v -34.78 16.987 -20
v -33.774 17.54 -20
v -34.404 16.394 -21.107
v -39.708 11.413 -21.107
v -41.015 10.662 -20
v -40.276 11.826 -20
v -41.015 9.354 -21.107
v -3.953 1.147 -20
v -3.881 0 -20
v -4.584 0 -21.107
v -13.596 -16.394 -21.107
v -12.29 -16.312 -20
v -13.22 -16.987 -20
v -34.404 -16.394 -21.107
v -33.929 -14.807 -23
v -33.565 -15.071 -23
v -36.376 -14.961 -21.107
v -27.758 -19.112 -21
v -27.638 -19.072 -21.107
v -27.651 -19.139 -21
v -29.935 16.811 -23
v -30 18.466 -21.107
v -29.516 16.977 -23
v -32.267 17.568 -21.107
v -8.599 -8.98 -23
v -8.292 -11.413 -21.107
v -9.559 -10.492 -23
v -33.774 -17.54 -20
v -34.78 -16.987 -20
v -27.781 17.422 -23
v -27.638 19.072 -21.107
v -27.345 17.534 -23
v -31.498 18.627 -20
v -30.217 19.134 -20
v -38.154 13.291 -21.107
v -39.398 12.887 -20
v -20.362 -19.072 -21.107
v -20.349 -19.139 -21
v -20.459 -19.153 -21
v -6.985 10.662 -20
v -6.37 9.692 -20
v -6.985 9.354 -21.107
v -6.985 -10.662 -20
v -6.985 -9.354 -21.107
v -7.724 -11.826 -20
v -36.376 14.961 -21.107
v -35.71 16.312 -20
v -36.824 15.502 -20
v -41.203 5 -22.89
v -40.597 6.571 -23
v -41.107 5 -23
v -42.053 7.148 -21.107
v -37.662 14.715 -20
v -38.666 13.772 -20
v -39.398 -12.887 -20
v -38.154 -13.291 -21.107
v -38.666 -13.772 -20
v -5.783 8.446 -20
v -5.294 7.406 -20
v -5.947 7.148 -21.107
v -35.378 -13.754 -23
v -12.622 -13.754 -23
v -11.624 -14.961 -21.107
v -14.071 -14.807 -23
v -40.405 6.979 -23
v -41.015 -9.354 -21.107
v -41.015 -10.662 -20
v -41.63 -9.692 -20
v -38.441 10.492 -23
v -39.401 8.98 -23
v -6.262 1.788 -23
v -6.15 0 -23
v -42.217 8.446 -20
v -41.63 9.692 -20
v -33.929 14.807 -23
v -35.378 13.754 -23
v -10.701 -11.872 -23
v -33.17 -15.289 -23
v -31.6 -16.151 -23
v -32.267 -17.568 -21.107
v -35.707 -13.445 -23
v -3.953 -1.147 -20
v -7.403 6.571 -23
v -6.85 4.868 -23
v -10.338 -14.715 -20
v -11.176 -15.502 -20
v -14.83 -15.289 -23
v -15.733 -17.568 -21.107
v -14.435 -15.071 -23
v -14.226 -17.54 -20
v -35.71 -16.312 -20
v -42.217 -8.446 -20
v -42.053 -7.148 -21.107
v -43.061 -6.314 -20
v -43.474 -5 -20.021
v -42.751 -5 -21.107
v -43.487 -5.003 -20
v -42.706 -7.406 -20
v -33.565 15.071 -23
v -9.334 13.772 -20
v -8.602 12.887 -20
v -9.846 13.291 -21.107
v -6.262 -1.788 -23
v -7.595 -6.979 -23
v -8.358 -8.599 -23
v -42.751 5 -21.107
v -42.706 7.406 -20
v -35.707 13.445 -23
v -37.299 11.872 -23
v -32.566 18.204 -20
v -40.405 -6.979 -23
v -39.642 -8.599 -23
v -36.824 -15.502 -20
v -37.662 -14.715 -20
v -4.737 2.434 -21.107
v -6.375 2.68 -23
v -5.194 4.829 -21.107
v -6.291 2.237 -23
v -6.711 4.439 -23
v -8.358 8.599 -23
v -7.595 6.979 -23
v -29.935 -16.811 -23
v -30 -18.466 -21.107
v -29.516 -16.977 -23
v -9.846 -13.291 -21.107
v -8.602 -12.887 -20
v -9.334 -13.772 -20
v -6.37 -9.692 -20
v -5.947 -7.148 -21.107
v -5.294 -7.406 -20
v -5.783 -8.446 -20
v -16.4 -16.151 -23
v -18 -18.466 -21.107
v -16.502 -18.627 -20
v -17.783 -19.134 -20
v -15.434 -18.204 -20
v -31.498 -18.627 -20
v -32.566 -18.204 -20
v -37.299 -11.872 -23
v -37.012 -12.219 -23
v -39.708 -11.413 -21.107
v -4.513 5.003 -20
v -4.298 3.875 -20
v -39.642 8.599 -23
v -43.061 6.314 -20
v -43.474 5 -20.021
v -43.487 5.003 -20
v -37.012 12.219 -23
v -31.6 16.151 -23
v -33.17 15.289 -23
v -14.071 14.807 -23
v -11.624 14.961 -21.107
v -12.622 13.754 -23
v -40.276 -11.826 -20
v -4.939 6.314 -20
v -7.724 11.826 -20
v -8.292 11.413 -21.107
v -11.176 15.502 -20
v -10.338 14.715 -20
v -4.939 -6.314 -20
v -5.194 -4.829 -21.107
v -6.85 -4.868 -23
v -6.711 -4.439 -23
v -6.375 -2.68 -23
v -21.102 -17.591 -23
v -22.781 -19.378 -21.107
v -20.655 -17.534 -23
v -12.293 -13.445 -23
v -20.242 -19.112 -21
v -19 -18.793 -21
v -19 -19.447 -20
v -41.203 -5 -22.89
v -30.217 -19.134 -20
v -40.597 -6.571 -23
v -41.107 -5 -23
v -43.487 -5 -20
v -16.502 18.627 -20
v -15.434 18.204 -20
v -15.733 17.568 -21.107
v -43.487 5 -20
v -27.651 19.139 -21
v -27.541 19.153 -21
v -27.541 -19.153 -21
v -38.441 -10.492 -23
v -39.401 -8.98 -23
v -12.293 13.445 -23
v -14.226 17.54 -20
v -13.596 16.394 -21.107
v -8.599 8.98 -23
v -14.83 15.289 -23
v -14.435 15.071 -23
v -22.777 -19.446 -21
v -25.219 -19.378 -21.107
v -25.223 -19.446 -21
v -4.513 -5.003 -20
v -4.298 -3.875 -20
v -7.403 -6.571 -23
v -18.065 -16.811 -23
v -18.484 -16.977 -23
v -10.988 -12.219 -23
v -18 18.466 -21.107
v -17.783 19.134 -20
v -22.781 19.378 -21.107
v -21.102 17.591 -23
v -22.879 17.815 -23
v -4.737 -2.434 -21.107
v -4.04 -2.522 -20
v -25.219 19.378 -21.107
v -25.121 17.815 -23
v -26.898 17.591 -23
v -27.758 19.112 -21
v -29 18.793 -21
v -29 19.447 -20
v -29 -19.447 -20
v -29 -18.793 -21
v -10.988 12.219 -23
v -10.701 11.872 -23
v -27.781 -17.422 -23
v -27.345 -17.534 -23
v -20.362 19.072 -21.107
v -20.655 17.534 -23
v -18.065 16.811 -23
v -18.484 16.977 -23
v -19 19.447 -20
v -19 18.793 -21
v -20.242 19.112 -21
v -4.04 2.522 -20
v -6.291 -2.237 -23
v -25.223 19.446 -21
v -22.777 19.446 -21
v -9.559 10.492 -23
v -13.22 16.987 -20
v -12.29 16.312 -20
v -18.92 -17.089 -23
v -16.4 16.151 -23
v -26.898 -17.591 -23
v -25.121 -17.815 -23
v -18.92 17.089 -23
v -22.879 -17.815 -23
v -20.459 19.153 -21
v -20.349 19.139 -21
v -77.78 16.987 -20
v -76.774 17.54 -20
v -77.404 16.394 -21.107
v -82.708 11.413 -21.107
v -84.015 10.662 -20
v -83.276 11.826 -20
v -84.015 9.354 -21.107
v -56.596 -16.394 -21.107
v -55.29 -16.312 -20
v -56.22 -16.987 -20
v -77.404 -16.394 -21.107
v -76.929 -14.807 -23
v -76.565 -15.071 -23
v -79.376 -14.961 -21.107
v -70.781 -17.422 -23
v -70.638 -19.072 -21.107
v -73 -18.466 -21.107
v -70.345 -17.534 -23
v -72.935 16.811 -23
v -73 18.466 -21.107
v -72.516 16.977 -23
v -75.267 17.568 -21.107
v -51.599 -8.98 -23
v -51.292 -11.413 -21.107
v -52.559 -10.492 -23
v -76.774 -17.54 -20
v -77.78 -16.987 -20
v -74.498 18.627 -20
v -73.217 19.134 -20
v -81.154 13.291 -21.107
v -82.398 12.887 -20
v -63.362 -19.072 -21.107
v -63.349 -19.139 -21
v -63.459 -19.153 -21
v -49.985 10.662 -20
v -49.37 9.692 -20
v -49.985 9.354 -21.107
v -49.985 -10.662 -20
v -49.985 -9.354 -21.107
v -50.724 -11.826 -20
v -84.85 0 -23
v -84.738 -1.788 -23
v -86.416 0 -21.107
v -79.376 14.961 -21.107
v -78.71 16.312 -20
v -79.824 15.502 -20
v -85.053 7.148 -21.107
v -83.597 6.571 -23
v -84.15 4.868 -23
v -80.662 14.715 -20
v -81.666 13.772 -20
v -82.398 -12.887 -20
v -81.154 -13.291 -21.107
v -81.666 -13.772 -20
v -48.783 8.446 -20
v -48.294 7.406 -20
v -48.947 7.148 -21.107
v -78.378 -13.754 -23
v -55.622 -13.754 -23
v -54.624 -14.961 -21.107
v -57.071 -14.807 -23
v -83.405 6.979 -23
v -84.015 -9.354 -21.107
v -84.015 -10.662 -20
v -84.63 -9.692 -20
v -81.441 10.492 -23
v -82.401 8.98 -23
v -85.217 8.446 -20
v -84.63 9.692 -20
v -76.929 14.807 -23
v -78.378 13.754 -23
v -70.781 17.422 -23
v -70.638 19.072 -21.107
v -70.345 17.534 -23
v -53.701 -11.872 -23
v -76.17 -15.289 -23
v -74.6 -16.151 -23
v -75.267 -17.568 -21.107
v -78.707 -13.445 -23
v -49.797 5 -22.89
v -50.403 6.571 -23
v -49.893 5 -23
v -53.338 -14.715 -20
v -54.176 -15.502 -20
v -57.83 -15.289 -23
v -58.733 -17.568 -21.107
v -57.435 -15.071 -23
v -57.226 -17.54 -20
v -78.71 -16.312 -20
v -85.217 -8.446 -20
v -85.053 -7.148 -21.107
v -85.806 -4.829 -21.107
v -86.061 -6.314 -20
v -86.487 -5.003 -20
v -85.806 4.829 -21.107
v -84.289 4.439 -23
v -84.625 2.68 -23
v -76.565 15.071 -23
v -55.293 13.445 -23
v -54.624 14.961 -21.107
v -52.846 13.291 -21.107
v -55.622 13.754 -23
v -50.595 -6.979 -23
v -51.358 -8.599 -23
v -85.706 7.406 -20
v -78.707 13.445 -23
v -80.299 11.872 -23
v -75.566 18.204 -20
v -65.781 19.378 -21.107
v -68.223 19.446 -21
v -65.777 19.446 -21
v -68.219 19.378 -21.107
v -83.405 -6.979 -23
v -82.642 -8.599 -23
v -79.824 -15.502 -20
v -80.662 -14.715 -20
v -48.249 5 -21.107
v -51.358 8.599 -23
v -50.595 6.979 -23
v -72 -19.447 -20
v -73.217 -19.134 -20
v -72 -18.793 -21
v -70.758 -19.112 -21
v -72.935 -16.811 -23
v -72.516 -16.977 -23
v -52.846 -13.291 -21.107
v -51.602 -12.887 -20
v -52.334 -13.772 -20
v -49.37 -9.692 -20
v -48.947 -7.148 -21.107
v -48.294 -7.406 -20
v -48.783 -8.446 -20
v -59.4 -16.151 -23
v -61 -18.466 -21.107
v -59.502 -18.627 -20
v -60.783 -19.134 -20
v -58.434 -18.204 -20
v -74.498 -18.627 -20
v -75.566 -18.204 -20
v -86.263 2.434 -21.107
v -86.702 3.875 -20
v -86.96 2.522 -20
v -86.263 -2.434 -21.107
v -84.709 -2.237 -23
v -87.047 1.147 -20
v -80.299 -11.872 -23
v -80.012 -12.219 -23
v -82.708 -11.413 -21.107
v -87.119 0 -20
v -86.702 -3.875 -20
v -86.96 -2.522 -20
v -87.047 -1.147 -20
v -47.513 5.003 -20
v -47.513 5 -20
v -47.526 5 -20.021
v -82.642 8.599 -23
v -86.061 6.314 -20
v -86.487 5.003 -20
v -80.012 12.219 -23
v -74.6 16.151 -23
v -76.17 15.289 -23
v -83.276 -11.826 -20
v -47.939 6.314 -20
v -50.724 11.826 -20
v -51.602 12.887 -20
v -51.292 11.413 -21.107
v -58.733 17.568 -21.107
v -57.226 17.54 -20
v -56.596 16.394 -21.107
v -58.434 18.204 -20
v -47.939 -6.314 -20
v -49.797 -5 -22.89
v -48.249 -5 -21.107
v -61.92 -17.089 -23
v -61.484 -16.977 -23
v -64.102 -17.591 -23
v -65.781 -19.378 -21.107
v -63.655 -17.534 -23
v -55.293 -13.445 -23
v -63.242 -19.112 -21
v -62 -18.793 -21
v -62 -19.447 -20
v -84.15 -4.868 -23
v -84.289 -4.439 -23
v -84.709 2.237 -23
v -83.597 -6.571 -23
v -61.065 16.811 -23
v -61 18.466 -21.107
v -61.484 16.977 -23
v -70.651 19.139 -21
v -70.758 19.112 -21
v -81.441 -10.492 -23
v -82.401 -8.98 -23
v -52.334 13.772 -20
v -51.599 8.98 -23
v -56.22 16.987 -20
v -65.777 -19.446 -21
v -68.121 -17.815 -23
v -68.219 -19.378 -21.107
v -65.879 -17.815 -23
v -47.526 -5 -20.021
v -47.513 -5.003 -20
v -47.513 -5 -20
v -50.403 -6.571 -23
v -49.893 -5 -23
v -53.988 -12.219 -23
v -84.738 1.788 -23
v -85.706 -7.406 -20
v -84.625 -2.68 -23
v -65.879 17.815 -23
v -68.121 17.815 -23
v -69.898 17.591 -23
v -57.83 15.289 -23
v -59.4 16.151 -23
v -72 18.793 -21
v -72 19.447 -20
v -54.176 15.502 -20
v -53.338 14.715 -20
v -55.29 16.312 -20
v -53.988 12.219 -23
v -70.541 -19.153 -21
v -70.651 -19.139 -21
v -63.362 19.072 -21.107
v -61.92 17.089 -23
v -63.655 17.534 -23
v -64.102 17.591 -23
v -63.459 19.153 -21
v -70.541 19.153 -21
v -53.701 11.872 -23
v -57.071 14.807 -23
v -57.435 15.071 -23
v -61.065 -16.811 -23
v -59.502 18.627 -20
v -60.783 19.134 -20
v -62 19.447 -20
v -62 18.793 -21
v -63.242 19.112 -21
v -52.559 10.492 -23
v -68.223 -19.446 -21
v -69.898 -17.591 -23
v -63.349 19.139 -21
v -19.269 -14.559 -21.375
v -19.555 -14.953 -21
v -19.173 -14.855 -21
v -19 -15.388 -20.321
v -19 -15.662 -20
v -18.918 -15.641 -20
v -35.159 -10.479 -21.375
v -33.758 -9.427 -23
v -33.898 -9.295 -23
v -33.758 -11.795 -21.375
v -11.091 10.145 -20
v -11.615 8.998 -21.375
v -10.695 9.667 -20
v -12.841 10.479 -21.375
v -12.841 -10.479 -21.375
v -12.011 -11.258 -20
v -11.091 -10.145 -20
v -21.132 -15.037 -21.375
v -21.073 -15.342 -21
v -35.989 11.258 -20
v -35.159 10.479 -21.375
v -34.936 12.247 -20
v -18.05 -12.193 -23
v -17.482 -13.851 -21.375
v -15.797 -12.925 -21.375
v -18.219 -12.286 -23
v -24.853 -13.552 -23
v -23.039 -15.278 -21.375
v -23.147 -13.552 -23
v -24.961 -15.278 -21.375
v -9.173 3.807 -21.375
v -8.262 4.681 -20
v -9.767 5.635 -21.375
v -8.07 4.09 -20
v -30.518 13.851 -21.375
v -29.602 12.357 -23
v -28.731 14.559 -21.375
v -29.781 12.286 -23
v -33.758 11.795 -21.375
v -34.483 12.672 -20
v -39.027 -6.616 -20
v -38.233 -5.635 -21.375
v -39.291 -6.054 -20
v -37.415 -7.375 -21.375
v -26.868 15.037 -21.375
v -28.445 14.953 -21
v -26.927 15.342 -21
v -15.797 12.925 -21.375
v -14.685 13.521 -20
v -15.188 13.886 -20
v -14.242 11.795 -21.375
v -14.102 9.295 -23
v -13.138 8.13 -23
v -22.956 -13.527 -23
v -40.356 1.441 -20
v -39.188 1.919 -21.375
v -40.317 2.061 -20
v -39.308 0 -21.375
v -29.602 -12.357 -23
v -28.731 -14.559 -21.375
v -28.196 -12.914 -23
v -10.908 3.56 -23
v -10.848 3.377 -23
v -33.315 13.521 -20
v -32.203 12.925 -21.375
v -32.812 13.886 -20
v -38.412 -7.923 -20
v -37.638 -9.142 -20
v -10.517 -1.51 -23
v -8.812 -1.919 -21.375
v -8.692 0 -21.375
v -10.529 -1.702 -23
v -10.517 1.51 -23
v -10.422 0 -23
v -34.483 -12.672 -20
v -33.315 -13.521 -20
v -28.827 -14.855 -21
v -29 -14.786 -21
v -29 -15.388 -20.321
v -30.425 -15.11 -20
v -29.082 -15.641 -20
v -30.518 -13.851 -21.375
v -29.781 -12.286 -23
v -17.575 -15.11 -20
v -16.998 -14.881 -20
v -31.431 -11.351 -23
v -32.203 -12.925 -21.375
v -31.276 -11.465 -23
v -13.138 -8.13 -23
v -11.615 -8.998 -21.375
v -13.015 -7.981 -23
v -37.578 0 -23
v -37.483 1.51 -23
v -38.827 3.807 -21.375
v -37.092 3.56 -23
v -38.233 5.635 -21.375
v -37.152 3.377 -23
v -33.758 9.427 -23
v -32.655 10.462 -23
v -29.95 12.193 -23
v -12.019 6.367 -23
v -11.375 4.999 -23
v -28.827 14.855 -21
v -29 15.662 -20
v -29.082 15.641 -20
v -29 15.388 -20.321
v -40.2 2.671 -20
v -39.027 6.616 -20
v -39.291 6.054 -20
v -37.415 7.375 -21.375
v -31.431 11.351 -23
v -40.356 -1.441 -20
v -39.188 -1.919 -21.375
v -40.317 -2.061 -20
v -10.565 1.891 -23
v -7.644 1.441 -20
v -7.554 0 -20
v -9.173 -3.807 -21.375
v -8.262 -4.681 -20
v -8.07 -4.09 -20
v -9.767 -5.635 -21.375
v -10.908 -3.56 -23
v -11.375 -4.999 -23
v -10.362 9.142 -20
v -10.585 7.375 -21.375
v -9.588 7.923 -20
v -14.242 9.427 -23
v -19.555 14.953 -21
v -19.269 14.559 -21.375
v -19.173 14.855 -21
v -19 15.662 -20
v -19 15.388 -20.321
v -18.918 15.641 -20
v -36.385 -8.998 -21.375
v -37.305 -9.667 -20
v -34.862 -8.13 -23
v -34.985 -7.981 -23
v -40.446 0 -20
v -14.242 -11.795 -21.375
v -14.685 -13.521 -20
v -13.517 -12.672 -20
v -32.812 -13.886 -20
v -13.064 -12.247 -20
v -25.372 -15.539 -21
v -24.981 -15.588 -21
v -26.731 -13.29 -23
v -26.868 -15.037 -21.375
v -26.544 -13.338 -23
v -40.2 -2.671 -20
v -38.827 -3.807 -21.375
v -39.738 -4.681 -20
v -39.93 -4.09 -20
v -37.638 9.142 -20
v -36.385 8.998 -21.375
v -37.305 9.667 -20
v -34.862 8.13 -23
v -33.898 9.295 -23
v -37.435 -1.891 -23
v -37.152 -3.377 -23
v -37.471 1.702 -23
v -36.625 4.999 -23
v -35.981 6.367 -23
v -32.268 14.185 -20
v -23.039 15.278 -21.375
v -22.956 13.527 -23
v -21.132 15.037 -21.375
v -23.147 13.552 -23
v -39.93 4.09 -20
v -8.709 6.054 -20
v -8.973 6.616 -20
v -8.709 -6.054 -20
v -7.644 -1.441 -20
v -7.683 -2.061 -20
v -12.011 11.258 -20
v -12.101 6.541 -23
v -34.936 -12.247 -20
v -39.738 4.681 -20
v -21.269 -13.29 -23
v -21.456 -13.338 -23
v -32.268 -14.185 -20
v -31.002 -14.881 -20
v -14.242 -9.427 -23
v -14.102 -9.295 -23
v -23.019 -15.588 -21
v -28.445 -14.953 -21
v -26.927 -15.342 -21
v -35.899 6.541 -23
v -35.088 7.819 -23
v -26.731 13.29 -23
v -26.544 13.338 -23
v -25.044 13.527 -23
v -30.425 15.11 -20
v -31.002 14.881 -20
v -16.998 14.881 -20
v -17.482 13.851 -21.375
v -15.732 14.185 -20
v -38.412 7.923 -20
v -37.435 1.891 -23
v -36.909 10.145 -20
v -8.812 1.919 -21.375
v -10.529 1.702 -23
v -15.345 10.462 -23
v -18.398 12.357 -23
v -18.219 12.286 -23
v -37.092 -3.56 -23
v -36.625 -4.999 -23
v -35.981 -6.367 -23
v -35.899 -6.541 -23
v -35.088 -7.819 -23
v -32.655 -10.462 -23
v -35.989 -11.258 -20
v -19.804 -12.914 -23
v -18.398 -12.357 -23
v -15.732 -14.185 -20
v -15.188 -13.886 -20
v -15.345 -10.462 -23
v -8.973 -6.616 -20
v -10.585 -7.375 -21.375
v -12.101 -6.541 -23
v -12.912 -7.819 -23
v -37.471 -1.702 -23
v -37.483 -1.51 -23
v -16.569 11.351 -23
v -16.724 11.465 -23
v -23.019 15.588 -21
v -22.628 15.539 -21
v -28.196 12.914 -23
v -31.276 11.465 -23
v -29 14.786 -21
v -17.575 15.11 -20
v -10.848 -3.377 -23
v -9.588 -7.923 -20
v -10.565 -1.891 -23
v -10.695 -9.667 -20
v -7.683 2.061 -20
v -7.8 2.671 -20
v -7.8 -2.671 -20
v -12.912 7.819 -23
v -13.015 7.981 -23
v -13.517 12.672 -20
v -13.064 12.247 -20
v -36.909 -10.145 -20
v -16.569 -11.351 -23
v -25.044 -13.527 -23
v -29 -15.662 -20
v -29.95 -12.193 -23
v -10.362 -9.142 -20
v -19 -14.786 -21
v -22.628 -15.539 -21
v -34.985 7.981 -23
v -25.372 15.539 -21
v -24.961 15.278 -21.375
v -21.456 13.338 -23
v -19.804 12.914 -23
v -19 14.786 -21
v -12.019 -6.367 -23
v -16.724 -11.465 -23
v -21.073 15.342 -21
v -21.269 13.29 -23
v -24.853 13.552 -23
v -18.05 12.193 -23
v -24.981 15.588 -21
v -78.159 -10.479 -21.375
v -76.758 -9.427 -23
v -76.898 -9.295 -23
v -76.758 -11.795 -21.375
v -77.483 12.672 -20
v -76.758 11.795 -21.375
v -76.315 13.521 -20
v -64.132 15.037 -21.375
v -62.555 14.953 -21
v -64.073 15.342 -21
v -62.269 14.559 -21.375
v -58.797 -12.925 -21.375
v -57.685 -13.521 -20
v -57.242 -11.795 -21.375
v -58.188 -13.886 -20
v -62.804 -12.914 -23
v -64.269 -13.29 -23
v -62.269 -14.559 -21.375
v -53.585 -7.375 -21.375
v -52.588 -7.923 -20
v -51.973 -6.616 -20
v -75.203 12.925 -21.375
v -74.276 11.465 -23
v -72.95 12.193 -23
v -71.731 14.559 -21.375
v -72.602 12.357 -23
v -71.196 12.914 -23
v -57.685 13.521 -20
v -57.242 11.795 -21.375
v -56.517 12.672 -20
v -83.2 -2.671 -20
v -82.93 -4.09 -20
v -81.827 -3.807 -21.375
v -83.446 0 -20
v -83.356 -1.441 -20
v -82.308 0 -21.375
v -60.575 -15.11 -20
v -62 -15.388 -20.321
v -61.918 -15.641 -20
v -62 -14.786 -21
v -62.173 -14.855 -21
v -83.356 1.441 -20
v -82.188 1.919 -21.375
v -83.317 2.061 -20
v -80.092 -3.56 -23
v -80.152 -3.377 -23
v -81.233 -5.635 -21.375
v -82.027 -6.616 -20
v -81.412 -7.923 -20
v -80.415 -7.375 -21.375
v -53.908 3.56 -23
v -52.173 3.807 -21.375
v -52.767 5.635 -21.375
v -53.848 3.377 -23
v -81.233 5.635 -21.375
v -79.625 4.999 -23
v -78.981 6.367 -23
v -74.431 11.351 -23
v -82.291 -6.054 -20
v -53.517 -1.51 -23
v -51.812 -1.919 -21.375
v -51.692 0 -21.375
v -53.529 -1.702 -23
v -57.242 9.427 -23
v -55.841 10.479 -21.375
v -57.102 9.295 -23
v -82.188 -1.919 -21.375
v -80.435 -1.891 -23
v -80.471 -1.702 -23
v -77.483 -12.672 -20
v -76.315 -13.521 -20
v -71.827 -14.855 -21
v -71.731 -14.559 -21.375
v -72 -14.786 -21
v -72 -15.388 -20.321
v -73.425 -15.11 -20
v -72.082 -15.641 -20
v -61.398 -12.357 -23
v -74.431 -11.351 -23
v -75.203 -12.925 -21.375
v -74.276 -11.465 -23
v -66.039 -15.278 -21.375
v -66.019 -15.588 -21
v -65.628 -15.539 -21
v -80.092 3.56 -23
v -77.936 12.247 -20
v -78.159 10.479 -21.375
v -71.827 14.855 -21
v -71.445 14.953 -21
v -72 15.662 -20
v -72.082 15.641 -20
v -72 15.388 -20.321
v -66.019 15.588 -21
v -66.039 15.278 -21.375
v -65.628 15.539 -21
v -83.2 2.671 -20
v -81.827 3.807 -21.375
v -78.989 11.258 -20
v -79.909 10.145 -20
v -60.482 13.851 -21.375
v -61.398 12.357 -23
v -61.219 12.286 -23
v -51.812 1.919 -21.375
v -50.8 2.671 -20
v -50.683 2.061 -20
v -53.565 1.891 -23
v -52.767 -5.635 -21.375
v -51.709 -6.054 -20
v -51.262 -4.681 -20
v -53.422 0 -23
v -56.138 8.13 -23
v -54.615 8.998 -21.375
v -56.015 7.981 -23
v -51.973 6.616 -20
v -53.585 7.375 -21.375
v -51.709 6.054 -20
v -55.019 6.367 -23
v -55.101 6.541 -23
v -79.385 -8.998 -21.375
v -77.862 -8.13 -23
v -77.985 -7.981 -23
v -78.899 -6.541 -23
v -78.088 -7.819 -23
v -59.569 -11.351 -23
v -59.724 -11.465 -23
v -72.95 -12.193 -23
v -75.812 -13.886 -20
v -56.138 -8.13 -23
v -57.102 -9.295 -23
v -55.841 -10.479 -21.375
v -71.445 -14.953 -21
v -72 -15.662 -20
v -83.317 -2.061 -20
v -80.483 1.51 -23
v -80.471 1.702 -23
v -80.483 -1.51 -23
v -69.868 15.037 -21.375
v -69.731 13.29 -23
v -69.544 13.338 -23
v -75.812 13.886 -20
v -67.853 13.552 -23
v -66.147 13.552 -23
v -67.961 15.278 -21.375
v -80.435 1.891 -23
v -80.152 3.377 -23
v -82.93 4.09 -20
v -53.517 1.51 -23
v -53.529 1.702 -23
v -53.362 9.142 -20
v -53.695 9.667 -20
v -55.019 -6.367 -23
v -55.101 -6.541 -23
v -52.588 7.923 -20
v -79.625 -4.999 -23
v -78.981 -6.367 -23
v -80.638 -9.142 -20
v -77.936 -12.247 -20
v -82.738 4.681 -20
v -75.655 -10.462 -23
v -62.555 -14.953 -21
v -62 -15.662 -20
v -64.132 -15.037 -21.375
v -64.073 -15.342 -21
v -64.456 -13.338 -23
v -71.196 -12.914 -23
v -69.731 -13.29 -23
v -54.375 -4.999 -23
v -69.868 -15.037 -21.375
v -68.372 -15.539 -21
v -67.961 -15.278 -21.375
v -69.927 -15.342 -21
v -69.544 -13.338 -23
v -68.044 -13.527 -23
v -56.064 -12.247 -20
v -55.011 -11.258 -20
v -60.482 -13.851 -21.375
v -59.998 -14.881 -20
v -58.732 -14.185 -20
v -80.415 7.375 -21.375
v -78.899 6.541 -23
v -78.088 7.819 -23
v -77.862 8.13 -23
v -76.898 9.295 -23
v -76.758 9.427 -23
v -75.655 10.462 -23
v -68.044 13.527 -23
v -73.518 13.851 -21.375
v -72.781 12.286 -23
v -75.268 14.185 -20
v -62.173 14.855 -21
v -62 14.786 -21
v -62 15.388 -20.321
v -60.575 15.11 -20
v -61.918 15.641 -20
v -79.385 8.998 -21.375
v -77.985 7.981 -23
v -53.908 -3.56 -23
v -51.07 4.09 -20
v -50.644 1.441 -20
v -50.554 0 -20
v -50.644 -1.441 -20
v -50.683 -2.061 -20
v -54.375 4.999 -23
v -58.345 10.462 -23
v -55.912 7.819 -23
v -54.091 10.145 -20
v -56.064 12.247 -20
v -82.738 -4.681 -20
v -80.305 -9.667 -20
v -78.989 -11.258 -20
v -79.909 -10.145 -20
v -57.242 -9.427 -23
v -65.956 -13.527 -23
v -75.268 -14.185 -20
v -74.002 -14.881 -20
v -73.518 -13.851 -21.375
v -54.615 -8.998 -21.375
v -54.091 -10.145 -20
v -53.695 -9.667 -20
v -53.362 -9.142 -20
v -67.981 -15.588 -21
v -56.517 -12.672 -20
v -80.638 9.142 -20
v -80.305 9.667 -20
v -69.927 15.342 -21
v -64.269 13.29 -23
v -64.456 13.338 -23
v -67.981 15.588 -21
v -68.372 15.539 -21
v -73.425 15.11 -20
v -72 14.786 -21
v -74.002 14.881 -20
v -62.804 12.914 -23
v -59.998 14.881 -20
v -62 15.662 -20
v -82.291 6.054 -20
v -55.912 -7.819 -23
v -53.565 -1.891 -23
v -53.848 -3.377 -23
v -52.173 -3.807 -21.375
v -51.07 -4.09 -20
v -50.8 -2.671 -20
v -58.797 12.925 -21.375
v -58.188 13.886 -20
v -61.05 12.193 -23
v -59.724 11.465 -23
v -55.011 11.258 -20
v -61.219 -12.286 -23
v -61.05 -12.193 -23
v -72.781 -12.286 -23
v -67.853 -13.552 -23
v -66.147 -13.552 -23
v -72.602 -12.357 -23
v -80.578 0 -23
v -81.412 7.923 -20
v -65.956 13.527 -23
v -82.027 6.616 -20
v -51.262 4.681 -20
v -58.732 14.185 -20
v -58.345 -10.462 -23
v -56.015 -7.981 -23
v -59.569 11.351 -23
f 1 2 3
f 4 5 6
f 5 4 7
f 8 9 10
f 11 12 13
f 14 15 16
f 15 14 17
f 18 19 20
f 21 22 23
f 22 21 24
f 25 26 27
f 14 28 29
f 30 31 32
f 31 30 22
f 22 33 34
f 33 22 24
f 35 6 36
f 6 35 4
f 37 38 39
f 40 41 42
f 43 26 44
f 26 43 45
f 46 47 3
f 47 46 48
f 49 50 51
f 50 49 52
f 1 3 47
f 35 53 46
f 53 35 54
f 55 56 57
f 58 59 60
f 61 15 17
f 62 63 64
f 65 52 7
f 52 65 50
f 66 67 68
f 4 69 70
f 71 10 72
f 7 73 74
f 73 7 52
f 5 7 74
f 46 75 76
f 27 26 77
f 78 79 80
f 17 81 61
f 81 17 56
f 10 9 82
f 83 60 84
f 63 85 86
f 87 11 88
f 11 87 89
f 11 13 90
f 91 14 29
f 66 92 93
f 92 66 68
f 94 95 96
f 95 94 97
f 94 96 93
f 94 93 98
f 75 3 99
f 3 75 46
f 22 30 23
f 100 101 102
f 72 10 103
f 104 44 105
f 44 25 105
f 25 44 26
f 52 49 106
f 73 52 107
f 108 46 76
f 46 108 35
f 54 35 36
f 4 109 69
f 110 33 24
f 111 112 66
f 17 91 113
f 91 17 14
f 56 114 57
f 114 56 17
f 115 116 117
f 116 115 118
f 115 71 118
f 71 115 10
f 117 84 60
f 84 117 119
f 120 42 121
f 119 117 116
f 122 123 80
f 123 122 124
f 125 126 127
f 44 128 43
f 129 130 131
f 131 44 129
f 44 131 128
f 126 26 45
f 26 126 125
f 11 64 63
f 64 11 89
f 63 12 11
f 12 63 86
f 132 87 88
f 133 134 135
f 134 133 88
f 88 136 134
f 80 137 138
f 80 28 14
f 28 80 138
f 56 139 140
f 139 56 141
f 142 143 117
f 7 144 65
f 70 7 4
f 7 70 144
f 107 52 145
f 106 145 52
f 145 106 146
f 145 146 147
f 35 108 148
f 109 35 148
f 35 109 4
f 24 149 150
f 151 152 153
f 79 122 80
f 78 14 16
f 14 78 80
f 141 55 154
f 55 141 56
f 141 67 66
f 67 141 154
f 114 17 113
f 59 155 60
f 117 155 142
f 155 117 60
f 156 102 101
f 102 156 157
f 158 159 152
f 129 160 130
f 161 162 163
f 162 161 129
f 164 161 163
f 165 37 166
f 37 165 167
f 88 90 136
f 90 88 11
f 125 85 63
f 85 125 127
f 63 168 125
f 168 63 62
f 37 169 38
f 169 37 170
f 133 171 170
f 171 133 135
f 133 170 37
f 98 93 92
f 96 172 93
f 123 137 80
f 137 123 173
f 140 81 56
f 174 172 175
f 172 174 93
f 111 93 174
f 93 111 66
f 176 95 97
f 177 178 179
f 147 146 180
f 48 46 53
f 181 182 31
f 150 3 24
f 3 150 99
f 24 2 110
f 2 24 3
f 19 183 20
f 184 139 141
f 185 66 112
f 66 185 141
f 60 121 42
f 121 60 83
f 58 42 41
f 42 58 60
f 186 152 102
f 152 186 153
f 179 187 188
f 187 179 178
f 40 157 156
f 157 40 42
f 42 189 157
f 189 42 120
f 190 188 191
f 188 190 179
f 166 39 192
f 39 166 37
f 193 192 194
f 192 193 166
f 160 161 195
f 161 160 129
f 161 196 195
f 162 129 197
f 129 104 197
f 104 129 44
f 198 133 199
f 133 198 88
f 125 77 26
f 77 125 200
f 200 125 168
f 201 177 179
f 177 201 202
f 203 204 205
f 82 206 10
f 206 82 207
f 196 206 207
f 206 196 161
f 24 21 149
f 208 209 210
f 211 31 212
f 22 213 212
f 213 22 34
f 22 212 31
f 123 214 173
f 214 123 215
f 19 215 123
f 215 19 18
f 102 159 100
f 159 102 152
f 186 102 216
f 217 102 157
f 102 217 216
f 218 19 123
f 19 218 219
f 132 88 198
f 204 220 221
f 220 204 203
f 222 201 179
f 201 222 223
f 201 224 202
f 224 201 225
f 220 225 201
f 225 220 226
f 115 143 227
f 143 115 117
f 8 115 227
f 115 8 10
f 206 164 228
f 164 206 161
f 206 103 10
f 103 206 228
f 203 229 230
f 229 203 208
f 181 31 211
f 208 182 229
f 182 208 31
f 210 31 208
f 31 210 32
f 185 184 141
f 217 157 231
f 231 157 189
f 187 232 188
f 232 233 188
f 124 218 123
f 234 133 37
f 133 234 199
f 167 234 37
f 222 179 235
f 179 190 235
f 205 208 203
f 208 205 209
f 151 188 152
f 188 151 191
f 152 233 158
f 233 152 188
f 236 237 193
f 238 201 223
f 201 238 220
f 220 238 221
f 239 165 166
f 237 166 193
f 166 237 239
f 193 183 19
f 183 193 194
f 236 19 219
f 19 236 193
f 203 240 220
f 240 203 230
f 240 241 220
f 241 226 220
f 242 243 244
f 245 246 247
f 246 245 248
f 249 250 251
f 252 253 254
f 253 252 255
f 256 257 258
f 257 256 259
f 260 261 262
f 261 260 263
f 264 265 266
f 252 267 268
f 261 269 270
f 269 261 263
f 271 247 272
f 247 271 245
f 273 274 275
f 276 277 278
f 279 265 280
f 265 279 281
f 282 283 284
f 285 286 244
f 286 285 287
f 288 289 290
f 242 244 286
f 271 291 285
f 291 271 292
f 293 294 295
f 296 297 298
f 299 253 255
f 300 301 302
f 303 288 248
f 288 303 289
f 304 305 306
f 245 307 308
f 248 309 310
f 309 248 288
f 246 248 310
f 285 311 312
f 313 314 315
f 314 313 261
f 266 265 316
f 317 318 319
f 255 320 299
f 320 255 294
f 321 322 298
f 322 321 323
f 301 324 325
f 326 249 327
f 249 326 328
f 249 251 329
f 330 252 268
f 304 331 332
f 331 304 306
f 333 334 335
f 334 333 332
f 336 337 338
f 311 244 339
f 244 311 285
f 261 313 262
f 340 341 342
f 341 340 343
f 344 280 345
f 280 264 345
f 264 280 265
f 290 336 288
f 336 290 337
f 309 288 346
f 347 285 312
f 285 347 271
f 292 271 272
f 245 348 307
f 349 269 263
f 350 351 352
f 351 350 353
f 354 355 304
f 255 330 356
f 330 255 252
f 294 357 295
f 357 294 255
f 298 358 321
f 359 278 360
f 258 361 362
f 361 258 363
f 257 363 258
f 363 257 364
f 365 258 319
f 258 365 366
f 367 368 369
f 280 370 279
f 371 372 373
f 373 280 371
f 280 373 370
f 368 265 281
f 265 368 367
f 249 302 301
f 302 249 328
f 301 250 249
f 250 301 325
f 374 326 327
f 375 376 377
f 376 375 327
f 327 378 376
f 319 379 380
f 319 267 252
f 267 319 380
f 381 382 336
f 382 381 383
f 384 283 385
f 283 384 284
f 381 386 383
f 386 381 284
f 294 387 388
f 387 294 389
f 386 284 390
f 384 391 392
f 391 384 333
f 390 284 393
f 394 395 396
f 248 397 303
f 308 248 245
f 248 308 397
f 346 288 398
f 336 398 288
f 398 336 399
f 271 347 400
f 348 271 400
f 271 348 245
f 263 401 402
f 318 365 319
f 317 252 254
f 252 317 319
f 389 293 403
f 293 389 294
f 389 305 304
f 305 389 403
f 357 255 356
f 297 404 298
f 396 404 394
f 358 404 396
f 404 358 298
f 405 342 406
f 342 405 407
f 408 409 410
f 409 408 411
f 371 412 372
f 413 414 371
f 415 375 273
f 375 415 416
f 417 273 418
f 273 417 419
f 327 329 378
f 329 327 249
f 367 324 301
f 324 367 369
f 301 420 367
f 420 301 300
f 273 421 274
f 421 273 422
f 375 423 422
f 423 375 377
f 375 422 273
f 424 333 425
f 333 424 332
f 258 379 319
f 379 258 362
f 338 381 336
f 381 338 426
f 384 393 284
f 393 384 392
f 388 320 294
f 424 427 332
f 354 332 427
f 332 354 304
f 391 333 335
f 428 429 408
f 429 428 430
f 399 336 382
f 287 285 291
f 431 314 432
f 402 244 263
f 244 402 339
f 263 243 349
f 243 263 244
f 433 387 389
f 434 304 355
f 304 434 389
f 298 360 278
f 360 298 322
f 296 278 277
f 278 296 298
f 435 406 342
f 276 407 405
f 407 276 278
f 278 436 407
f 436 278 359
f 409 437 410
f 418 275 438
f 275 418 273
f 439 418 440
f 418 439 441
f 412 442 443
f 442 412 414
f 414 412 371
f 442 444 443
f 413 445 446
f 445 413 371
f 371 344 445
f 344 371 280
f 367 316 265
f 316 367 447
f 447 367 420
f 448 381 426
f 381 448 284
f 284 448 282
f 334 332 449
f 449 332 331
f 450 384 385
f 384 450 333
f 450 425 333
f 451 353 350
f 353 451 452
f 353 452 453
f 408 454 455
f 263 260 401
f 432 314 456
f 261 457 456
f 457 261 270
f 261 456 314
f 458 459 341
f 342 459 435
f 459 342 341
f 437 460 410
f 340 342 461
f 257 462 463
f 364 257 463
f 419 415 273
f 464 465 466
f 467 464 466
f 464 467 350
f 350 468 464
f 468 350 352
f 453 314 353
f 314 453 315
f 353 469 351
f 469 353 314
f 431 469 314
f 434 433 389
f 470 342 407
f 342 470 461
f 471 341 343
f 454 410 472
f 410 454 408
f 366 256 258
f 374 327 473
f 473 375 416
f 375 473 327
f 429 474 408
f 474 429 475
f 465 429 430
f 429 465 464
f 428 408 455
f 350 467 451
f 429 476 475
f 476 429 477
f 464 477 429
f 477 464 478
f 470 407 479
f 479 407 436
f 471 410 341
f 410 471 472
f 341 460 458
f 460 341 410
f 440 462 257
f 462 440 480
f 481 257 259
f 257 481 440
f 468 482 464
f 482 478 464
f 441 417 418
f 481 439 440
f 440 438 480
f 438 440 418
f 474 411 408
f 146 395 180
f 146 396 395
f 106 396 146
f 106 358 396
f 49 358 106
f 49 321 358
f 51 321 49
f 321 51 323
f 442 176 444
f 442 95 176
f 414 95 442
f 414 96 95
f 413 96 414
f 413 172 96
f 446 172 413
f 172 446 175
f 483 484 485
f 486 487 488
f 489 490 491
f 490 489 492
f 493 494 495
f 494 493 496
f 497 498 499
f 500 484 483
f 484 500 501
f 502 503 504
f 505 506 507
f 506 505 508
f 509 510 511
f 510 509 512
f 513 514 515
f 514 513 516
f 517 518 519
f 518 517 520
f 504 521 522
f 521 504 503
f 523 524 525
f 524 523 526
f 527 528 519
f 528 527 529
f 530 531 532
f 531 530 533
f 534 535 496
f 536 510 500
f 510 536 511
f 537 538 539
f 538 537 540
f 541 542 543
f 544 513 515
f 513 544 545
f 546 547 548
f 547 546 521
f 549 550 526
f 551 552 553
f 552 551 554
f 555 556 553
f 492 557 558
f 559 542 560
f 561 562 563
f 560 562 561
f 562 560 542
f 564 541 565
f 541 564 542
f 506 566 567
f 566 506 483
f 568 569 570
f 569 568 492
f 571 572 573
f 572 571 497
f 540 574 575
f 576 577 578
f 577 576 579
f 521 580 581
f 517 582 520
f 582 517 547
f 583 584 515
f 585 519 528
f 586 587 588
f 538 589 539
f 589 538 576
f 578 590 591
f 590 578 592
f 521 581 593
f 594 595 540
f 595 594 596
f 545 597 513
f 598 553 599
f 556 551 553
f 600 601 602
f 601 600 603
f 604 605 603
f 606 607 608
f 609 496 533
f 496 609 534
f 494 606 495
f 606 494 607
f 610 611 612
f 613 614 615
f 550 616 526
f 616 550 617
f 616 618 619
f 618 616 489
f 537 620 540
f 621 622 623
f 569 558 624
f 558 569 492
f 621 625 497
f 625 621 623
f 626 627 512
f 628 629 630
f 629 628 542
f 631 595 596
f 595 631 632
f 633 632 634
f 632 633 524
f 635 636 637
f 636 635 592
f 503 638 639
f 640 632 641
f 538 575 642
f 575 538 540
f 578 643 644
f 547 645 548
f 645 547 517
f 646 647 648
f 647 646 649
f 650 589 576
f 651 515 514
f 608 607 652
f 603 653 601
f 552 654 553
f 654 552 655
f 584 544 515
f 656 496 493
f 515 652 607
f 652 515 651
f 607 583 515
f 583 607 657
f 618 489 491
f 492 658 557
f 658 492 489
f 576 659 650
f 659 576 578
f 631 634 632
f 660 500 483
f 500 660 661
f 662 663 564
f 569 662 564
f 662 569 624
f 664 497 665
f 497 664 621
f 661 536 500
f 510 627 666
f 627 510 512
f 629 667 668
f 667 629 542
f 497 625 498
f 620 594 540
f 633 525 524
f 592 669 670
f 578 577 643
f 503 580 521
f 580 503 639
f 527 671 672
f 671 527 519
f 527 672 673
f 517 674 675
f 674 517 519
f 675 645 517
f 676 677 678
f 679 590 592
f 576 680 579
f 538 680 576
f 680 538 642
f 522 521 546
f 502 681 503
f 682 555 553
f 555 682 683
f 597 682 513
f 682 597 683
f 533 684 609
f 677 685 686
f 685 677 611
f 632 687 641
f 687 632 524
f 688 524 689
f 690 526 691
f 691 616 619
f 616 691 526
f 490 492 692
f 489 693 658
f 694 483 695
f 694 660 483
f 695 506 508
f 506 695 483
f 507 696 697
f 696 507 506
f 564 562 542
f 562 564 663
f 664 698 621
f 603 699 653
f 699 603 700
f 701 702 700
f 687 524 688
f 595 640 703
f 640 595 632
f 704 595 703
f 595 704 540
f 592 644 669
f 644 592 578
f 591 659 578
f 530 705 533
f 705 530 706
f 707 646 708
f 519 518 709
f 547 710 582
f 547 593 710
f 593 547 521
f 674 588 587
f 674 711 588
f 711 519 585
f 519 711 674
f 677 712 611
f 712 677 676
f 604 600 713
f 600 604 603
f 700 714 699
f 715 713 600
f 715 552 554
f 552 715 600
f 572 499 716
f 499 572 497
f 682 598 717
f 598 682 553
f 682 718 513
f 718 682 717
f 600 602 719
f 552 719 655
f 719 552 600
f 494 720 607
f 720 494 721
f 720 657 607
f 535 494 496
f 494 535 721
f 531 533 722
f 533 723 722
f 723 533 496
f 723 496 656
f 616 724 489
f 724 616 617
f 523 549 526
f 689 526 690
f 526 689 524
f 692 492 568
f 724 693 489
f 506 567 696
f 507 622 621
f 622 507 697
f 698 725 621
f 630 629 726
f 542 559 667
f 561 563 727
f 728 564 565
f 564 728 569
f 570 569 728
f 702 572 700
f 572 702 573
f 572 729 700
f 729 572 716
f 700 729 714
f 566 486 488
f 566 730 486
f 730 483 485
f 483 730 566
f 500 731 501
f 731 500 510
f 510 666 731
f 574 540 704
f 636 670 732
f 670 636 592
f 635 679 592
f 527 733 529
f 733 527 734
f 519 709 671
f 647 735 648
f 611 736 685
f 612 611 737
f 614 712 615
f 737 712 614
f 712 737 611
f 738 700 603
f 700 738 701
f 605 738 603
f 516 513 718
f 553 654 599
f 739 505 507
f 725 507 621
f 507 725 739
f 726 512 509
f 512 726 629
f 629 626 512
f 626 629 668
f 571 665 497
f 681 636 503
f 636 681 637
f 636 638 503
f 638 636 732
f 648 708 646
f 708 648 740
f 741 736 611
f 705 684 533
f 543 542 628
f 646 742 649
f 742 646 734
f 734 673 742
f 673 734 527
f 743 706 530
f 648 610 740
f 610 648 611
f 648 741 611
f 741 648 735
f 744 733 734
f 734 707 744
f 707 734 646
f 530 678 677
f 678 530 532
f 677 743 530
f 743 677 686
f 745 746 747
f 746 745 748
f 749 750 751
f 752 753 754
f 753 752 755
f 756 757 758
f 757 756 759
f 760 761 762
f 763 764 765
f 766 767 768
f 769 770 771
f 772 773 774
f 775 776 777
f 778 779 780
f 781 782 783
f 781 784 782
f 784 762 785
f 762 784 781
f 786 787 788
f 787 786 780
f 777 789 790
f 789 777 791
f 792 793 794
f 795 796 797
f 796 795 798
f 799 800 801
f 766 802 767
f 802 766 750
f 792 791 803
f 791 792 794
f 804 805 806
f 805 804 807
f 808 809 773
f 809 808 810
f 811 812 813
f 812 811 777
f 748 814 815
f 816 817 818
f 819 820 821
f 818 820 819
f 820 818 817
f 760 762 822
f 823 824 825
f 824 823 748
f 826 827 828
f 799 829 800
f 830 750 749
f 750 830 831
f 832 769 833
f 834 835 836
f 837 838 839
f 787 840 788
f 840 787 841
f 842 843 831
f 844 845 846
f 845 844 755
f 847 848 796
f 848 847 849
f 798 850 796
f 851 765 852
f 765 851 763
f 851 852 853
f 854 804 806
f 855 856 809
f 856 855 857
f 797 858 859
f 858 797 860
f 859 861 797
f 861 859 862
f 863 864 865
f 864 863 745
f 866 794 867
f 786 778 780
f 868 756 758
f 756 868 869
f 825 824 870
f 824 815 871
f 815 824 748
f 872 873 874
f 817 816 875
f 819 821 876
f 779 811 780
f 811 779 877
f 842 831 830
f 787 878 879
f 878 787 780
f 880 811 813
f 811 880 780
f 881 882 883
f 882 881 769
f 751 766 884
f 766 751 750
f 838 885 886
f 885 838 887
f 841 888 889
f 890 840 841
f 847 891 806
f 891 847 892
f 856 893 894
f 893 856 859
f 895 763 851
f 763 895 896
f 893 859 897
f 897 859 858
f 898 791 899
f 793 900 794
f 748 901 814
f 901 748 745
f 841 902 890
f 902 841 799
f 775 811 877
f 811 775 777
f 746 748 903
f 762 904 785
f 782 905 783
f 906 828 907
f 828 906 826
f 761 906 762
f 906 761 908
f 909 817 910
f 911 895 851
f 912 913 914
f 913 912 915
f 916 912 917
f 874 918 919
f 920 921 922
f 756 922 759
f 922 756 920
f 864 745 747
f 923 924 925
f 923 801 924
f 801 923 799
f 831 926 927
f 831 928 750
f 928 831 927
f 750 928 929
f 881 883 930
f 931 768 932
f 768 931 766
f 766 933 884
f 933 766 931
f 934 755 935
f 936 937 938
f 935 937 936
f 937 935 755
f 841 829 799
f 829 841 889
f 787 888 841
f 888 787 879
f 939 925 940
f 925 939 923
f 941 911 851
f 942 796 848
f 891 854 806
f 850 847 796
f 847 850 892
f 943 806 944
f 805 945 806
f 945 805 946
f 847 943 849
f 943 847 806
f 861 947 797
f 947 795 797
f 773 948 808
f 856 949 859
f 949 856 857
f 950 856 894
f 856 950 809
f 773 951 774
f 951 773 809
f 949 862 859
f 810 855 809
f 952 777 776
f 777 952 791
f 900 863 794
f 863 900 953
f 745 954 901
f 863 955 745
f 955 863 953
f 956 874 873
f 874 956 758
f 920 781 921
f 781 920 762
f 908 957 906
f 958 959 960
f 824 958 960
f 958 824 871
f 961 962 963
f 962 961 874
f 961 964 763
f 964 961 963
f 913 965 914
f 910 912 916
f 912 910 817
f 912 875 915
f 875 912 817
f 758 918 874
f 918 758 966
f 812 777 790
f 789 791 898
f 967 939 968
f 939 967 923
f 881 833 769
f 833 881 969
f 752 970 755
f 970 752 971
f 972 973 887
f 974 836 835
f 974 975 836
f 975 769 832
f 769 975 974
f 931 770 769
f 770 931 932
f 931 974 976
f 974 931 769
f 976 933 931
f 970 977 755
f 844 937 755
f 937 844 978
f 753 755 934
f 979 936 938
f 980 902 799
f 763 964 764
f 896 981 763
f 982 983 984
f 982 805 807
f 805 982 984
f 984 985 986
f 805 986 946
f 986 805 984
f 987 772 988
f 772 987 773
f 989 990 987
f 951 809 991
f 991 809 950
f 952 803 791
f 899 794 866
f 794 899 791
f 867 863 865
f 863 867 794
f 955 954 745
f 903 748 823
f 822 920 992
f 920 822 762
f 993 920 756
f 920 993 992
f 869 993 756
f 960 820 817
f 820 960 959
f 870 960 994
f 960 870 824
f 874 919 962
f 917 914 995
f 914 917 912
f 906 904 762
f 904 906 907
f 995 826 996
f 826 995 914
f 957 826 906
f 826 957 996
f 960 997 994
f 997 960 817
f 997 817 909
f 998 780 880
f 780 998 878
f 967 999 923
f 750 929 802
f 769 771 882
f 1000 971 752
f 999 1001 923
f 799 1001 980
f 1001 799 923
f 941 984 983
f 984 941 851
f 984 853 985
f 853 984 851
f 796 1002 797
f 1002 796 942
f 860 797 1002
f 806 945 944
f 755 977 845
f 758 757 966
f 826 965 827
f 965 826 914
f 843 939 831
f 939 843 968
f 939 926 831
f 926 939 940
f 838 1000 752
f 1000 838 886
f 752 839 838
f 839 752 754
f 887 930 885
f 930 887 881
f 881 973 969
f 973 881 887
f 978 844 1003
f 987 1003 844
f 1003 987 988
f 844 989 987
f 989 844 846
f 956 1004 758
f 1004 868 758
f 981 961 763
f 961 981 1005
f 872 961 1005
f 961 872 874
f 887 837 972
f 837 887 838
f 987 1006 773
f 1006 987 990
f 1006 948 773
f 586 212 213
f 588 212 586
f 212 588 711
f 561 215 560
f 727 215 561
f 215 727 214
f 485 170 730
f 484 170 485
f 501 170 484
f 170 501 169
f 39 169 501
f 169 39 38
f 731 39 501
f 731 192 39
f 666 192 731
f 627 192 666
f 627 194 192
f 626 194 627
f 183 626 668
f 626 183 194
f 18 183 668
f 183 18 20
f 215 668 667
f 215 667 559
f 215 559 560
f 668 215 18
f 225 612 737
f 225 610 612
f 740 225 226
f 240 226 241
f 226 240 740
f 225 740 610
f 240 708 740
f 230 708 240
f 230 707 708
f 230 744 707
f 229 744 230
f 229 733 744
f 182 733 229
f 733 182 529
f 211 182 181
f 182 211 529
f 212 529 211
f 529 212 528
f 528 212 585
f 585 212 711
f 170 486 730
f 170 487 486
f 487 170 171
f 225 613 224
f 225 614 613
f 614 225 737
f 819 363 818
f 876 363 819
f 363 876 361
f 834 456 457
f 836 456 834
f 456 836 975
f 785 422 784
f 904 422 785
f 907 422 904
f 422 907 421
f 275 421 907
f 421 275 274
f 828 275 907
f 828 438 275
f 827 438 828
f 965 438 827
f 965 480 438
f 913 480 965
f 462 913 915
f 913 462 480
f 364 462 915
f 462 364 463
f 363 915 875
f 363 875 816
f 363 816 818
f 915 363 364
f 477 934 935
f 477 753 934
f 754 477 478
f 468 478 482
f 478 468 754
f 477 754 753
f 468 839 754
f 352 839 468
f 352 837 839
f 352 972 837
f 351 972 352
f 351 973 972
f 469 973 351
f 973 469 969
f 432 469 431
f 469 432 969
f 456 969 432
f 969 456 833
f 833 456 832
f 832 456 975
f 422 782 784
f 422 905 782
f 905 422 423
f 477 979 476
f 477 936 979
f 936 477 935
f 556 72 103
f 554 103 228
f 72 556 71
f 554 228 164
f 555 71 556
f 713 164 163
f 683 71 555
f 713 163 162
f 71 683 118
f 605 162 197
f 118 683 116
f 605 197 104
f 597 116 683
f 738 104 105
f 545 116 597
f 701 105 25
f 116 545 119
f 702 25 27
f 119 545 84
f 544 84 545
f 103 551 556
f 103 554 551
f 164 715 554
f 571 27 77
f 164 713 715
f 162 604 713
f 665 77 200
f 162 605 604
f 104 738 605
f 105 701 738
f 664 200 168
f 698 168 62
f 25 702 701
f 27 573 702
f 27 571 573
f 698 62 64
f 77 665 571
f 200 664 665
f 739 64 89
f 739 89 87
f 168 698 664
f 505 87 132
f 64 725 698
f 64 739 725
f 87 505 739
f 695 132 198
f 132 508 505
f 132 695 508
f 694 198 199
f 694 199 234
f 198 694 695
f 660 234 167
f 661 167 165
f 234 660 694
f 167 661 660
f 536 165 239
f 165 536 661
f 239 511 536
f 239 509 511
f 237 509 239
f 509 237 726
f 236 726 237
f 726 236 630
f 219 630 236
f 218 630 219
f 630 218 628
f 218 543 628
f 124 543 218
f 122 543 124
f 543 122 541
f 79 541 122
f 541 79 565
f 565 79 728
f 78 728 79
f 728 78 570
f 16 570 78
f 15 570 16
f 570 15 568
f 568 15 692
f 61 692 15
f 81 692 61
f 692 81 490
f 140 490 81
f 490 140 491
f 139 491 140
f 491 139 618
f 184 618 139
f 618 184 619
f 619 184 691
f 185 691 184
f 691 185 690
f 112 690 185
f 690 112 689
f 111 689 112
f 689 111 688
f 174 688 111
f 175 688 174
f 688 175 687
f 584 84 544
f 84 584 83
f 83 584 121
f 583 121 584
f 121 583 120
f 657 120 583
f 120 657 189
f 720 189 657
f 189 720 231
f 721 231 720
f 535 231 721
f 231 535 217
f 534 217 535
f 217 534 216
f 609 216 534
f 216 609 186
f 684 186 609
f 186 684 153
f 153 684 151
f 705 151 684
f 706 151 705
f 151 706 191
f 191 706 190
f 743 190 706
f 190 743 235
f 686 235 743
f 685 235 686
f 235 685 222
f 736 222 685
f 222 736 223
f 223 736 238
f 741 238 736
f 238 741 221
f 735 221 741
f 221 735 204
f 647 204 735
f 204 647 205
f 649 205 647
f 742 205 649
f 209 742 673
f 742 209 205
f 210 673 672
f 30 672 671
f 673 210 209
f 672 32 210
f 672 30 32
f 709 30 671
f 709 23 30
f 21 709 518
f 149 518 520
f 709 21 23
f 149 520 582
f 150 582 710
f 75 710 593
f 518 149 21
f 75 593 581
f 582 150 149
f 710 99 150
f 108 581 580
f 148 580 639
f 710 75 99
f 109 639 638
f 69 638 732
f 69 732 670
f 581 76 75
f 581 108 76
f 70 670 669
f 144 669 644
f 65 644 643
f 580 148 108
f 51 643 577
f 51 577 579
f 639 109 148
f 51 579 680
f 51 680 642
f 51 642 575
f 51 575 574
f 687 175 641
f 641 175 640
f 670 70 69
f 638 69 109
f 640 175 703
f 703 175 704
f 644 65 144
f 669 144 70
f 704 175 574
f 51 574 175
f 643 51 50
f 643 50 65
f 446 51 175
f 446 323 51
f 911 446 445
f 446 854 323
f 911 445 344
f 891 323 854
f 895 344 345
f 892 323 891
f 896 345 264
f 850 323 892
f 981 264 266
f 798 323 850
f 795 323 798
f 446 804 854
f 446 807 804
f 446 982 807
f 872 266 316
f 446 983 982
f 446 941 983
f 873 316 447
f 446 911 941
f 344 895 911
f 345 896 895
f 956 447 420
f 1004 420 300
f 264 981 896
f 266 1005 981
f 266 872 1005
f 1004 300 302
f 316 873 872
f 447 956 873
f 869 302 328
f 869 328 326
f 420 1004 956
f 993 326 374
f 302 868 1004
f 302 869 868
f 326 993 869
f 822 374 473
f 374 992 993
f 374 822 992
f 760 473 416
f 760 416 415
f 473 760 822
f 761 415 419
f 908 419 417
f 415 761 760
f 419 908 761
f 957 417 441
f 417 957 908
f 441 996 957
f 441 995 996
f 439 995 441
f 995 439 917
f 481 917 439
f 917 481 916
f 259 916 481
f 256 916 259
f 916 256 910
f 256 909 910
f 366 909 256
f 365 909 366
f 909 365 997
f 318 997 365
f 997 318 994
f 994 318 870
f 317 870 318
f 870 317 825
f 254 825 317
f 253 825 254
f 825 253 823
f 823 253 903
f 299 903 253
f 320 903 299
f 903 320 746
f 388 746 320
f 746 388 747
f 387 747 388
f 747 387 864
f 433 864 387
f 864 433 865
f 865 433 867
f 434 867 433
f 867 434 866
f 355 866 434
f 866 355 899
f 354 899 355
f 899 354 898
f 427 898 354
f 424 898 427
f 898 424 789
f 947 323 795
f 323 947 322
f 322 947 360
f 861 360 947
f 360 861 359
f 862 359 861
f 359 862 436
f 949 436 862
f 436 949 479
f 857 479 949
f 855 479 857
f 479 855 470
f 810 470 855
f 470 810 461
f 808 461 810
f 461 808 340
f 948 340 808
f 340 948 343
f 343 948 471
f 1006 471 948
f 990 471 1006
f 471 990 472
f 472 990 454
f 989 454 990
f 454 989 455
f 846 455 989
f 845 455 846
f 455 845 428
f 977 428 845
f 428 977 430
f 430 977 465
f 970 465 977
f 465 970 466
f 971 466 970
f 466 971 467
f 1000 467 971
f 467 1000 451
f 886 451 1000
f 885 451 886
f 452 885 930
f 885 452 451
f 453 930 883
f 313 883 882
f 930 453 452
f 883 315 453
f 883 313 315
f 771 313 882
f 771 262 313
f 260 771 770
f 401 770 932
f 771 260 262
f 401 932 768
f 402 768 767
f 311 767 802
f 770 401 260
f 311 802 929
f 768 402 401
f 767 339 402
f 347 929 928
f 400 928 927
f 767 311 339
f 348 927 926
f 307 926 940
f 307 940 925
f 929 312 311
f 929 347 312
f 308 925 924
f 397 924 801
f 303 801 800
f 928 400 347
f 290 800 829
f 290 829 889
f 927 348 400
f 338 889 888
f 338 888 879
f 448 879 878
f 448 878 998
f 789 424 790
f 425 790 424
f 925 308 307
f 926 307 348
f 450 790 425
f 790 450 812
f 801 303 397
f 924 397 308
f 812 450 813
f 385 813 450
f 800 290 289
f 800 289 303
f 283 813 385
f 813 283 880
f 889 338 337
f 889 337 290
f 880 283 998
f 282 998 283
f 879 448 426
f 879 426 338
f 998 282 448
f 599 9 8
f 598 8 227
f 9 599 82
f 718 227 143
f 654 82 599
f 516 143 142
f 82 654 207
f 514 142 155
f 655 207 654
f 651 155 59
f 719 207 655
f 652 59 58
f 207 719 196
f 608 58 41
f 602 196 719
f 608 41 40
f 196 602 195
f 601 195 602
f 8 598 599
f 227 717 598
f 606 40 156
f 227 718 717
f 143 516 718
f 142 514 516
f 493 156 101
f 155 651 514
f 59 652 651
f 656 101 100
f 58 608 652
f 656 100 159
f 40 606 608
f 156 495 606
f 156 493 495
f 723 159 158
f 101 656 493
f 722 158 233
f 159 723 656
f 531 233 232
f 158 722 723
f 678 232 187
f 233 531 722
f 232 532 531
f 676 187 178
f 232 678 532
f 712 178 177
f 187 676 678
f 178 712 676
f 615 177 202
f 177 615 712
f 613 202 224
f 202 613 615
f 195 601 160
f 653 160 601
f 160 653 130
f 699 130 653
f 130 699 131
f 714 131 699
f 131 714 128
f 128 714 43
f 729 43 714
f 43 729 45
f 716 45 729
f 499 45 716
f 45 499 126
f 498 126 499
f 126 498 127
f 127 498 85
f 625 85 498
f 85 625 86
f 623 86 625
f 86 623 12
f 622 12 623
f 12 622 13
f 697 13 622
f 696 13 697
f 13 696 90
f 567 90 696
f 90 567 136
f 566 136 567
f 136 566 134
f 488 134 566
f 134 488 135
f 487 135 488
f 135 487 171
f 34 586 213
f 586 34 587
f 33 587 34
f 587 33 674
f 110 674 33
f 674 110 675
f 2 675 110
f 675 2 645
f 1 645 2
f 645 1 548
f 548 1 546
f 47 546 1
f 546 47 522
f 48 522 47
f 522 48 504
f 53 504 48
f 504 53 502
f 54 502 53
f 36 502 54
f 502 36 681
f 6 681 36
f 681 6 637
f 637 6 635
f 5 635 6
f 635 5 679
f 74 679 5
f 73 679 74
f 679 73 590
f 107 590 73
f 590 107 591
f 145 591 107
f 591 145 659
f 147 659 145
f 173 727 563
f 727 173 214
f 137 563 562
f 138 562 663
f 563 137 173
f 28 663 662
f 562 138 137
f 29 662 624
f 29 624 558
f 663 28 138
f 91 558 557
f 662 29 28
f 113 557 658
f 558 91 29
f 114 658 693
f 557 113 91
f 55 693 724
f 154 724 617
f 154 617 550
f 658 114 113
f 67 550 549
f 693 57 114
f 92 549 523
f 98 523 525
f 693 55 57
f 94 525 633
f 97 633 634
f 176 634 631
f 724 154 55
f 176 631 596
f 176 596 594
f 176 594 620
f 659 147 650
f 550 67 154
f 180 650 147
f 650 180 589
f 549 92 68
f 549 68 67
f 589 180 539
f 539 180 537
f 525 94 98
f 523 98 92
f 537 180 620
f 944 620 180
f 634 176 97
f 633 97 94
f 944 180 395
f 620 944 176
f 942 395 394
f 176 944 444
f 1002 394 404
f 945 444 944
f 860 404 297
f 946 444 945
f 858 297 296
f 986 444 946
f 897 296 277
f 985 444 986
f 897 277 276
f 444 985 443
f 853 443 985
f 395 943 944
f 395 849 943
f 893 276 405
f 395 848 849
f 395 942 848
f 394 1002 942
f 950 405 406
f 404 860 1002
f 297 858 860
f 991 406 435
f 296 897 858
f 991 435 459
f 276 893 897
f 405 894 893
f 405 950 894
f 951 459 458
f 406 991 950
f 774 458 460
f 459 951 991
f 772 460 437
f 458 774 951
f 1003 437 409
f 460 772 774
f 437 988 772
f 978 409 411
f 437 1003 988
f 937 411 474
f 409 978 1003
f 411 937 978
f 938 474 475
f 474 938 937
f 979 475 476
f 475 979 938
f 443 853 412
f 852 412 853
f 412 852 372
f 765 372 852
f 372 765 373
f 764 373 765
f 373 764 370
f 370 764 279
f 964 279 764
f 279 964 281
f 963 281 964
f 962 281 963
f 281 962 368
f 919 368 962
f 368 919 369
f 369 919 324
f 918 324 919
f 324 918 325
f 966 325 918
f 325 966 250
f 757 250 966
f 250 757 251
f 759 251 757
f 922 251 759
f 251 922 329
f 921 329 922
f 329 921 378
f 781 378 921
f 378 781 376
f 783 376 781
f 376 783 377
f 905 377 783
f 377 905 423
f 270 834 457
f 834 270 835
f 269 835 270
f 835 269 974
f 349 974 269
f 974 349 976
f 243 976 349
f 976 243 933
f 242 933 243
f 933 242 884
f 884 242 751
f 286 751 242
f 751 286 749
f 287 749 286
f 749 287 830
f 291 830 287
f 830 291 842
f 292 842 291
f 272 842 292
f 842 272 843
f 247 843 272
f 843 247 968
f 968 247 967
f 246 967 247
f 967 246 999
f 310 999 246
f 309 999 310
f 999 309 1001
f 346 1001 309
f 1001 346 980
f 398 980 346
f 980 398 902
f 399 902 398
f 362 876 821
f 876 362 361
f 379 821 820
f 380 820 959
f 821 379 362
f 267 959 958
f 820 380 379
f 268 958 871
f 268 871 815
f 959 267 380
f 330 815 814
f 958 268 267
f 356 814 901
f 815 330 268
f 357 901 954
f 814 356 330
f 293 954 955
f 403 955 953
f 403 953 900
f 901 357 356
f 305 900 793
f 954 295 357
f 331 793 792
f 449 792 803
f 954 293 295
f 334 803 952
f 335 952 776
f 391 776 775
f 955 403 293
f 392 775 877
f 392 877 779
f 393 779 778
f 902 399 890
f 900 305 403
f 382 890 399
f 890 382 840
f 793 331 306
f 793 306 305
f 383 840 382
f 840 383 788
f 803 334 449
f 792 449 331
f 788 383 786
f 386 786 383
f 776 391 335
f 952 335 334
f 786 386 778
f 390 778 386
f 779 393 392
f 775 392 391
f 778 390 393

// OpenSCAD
// file: porte-balles.scad
include <dimensions.scad>

included=false; // this value will be overriden in the including file
included_in_attache=false; // this value will be overriden in the including file
included_in_sommet=false; // this value will be overriden in the including file


module balle()
{
    sphere(d=d);
}

module cubes_montants() 
{
    translate ([d/2+e+jeu/2-l_m/2,-d/2-e-jeu/2,0]) 
        cube([l_m,d+2*e+jeu, h_m+encastrement]);
    translate ([3*d/2+2*e+jeu/2-l_m/2,-d/2-e-jeu/2,0]) 
        cube([l_m,d+2*e+jeu, h_m+encastrement]);
}


module montants() {
    intersection () {
        difference() {
            enveloppe_ext(hull=false);
            enveloppe_int(hull=true);
        }
        cubes_montants();
    }
}

module porte_balles()
{
    intersection () {
        enveloppe(hull=true);
        union () {
            // ceinture basse
            translate ([0,-d/2-e-jeu/2,0]) 
                cube([2*d+3*e+jeu,d+2*e+jeu, h_cb]);
        }
    }
    // montants
    montants();
    
    if (included) {
        translate ([d/2+e+jeu/2,0,delta_h])
            balle();
        translate ([d/2+e+d+e+jeu/2,0,delta_h])
            balle();
    }
}

module grandes_spheres() {
    translate([d/2+e+jeu/2,0,delta_h])
        sphere(d=d+2*e+jeu);
    translate([d/2+e+d+e+jeu/2,0,delta_h])
        sphere(d=d+2*e+jeu);
}

module petites_spheres() {
    translate([d/2+e+jeu/2,0,delta_h])
        sphere(d=d+jeu);
    translate([d/2+e+d+e+jeu/2,0,delta_h])
        sphere(d=d+jeu);
}

module enveloppe_ext(hull) {
    if (hull) {
        hull () grandes_spheres();
    } else {
        grandes_spheres();
    }
}

module enveloppe_int(hull) {
    if (hull) {
        hull () petites_spheres();
    } else {
        petites_spheres();
    }
}

module enveloppe(hull)
{
    intersection () {
        difference () {
            enveloppe_ext(hull);
            enveloppe_int(hull);            
        }
        translate ([0,-d/2-e-jeu/2,0])
            cube([2*d+3*e+jeu,d+2*e+jeu,d /* suffisamment haut */]);
    }
}
    
if (!included && !included_in_sommet && !included_in_attache) {
    porte_balles();
} 
// file: dimensions.scad
epsilon = 0.1; // utilisé pour éviter que les évidements se fassent mal
jeu = 2; // jeu à prévoir 

encastrement = 1; // encastrements a coller

w = 50; // largeur intérieure du puits
l = 73; // longueur intérieure du puits
h = 15; // hauteur du puits
e = 3; // epaisseur du puits
h_cb = 10; // hauteur ceinture basse
delta_h = 7; // hauteur supplementaire a prevoir en dessous du milieu des balles pour qu'elles soient retenues dans la cage


ha = 40; //hauteur de l'attache, entre le puits et le porte balles

d = 40; // diamètre des balles de ping pong

l_m = 10; // largeur des montants
h_m = 20; // hauteur des montants

$fn=50;
// main file
include <dimensions.scad>

include <porte-balles.scad>

included=false; // this value will be overriden in the including file
included_in_sommet=true; // this value will override the ones in the include files



module porte_balles_sommet()
{
    intersection () {
        difference() {
            union() {
                enveloppe_ext(hull=false);
                translate([d/2+jeu,-l_m/2,0])
                    cube([d+e,l_m,d]);
            }
            enveloppe_int(hull=false);
            cubes_montants();
        }
        translate ([0,-d/2-e-jeu/2,h_m]) 
            cube([2*d+3*e+jeu,d+2*e+jeu, e]);
    }
}

    
if (!included) {
    rotate([0,180,0])
        porte_balles_sommet();
} 
